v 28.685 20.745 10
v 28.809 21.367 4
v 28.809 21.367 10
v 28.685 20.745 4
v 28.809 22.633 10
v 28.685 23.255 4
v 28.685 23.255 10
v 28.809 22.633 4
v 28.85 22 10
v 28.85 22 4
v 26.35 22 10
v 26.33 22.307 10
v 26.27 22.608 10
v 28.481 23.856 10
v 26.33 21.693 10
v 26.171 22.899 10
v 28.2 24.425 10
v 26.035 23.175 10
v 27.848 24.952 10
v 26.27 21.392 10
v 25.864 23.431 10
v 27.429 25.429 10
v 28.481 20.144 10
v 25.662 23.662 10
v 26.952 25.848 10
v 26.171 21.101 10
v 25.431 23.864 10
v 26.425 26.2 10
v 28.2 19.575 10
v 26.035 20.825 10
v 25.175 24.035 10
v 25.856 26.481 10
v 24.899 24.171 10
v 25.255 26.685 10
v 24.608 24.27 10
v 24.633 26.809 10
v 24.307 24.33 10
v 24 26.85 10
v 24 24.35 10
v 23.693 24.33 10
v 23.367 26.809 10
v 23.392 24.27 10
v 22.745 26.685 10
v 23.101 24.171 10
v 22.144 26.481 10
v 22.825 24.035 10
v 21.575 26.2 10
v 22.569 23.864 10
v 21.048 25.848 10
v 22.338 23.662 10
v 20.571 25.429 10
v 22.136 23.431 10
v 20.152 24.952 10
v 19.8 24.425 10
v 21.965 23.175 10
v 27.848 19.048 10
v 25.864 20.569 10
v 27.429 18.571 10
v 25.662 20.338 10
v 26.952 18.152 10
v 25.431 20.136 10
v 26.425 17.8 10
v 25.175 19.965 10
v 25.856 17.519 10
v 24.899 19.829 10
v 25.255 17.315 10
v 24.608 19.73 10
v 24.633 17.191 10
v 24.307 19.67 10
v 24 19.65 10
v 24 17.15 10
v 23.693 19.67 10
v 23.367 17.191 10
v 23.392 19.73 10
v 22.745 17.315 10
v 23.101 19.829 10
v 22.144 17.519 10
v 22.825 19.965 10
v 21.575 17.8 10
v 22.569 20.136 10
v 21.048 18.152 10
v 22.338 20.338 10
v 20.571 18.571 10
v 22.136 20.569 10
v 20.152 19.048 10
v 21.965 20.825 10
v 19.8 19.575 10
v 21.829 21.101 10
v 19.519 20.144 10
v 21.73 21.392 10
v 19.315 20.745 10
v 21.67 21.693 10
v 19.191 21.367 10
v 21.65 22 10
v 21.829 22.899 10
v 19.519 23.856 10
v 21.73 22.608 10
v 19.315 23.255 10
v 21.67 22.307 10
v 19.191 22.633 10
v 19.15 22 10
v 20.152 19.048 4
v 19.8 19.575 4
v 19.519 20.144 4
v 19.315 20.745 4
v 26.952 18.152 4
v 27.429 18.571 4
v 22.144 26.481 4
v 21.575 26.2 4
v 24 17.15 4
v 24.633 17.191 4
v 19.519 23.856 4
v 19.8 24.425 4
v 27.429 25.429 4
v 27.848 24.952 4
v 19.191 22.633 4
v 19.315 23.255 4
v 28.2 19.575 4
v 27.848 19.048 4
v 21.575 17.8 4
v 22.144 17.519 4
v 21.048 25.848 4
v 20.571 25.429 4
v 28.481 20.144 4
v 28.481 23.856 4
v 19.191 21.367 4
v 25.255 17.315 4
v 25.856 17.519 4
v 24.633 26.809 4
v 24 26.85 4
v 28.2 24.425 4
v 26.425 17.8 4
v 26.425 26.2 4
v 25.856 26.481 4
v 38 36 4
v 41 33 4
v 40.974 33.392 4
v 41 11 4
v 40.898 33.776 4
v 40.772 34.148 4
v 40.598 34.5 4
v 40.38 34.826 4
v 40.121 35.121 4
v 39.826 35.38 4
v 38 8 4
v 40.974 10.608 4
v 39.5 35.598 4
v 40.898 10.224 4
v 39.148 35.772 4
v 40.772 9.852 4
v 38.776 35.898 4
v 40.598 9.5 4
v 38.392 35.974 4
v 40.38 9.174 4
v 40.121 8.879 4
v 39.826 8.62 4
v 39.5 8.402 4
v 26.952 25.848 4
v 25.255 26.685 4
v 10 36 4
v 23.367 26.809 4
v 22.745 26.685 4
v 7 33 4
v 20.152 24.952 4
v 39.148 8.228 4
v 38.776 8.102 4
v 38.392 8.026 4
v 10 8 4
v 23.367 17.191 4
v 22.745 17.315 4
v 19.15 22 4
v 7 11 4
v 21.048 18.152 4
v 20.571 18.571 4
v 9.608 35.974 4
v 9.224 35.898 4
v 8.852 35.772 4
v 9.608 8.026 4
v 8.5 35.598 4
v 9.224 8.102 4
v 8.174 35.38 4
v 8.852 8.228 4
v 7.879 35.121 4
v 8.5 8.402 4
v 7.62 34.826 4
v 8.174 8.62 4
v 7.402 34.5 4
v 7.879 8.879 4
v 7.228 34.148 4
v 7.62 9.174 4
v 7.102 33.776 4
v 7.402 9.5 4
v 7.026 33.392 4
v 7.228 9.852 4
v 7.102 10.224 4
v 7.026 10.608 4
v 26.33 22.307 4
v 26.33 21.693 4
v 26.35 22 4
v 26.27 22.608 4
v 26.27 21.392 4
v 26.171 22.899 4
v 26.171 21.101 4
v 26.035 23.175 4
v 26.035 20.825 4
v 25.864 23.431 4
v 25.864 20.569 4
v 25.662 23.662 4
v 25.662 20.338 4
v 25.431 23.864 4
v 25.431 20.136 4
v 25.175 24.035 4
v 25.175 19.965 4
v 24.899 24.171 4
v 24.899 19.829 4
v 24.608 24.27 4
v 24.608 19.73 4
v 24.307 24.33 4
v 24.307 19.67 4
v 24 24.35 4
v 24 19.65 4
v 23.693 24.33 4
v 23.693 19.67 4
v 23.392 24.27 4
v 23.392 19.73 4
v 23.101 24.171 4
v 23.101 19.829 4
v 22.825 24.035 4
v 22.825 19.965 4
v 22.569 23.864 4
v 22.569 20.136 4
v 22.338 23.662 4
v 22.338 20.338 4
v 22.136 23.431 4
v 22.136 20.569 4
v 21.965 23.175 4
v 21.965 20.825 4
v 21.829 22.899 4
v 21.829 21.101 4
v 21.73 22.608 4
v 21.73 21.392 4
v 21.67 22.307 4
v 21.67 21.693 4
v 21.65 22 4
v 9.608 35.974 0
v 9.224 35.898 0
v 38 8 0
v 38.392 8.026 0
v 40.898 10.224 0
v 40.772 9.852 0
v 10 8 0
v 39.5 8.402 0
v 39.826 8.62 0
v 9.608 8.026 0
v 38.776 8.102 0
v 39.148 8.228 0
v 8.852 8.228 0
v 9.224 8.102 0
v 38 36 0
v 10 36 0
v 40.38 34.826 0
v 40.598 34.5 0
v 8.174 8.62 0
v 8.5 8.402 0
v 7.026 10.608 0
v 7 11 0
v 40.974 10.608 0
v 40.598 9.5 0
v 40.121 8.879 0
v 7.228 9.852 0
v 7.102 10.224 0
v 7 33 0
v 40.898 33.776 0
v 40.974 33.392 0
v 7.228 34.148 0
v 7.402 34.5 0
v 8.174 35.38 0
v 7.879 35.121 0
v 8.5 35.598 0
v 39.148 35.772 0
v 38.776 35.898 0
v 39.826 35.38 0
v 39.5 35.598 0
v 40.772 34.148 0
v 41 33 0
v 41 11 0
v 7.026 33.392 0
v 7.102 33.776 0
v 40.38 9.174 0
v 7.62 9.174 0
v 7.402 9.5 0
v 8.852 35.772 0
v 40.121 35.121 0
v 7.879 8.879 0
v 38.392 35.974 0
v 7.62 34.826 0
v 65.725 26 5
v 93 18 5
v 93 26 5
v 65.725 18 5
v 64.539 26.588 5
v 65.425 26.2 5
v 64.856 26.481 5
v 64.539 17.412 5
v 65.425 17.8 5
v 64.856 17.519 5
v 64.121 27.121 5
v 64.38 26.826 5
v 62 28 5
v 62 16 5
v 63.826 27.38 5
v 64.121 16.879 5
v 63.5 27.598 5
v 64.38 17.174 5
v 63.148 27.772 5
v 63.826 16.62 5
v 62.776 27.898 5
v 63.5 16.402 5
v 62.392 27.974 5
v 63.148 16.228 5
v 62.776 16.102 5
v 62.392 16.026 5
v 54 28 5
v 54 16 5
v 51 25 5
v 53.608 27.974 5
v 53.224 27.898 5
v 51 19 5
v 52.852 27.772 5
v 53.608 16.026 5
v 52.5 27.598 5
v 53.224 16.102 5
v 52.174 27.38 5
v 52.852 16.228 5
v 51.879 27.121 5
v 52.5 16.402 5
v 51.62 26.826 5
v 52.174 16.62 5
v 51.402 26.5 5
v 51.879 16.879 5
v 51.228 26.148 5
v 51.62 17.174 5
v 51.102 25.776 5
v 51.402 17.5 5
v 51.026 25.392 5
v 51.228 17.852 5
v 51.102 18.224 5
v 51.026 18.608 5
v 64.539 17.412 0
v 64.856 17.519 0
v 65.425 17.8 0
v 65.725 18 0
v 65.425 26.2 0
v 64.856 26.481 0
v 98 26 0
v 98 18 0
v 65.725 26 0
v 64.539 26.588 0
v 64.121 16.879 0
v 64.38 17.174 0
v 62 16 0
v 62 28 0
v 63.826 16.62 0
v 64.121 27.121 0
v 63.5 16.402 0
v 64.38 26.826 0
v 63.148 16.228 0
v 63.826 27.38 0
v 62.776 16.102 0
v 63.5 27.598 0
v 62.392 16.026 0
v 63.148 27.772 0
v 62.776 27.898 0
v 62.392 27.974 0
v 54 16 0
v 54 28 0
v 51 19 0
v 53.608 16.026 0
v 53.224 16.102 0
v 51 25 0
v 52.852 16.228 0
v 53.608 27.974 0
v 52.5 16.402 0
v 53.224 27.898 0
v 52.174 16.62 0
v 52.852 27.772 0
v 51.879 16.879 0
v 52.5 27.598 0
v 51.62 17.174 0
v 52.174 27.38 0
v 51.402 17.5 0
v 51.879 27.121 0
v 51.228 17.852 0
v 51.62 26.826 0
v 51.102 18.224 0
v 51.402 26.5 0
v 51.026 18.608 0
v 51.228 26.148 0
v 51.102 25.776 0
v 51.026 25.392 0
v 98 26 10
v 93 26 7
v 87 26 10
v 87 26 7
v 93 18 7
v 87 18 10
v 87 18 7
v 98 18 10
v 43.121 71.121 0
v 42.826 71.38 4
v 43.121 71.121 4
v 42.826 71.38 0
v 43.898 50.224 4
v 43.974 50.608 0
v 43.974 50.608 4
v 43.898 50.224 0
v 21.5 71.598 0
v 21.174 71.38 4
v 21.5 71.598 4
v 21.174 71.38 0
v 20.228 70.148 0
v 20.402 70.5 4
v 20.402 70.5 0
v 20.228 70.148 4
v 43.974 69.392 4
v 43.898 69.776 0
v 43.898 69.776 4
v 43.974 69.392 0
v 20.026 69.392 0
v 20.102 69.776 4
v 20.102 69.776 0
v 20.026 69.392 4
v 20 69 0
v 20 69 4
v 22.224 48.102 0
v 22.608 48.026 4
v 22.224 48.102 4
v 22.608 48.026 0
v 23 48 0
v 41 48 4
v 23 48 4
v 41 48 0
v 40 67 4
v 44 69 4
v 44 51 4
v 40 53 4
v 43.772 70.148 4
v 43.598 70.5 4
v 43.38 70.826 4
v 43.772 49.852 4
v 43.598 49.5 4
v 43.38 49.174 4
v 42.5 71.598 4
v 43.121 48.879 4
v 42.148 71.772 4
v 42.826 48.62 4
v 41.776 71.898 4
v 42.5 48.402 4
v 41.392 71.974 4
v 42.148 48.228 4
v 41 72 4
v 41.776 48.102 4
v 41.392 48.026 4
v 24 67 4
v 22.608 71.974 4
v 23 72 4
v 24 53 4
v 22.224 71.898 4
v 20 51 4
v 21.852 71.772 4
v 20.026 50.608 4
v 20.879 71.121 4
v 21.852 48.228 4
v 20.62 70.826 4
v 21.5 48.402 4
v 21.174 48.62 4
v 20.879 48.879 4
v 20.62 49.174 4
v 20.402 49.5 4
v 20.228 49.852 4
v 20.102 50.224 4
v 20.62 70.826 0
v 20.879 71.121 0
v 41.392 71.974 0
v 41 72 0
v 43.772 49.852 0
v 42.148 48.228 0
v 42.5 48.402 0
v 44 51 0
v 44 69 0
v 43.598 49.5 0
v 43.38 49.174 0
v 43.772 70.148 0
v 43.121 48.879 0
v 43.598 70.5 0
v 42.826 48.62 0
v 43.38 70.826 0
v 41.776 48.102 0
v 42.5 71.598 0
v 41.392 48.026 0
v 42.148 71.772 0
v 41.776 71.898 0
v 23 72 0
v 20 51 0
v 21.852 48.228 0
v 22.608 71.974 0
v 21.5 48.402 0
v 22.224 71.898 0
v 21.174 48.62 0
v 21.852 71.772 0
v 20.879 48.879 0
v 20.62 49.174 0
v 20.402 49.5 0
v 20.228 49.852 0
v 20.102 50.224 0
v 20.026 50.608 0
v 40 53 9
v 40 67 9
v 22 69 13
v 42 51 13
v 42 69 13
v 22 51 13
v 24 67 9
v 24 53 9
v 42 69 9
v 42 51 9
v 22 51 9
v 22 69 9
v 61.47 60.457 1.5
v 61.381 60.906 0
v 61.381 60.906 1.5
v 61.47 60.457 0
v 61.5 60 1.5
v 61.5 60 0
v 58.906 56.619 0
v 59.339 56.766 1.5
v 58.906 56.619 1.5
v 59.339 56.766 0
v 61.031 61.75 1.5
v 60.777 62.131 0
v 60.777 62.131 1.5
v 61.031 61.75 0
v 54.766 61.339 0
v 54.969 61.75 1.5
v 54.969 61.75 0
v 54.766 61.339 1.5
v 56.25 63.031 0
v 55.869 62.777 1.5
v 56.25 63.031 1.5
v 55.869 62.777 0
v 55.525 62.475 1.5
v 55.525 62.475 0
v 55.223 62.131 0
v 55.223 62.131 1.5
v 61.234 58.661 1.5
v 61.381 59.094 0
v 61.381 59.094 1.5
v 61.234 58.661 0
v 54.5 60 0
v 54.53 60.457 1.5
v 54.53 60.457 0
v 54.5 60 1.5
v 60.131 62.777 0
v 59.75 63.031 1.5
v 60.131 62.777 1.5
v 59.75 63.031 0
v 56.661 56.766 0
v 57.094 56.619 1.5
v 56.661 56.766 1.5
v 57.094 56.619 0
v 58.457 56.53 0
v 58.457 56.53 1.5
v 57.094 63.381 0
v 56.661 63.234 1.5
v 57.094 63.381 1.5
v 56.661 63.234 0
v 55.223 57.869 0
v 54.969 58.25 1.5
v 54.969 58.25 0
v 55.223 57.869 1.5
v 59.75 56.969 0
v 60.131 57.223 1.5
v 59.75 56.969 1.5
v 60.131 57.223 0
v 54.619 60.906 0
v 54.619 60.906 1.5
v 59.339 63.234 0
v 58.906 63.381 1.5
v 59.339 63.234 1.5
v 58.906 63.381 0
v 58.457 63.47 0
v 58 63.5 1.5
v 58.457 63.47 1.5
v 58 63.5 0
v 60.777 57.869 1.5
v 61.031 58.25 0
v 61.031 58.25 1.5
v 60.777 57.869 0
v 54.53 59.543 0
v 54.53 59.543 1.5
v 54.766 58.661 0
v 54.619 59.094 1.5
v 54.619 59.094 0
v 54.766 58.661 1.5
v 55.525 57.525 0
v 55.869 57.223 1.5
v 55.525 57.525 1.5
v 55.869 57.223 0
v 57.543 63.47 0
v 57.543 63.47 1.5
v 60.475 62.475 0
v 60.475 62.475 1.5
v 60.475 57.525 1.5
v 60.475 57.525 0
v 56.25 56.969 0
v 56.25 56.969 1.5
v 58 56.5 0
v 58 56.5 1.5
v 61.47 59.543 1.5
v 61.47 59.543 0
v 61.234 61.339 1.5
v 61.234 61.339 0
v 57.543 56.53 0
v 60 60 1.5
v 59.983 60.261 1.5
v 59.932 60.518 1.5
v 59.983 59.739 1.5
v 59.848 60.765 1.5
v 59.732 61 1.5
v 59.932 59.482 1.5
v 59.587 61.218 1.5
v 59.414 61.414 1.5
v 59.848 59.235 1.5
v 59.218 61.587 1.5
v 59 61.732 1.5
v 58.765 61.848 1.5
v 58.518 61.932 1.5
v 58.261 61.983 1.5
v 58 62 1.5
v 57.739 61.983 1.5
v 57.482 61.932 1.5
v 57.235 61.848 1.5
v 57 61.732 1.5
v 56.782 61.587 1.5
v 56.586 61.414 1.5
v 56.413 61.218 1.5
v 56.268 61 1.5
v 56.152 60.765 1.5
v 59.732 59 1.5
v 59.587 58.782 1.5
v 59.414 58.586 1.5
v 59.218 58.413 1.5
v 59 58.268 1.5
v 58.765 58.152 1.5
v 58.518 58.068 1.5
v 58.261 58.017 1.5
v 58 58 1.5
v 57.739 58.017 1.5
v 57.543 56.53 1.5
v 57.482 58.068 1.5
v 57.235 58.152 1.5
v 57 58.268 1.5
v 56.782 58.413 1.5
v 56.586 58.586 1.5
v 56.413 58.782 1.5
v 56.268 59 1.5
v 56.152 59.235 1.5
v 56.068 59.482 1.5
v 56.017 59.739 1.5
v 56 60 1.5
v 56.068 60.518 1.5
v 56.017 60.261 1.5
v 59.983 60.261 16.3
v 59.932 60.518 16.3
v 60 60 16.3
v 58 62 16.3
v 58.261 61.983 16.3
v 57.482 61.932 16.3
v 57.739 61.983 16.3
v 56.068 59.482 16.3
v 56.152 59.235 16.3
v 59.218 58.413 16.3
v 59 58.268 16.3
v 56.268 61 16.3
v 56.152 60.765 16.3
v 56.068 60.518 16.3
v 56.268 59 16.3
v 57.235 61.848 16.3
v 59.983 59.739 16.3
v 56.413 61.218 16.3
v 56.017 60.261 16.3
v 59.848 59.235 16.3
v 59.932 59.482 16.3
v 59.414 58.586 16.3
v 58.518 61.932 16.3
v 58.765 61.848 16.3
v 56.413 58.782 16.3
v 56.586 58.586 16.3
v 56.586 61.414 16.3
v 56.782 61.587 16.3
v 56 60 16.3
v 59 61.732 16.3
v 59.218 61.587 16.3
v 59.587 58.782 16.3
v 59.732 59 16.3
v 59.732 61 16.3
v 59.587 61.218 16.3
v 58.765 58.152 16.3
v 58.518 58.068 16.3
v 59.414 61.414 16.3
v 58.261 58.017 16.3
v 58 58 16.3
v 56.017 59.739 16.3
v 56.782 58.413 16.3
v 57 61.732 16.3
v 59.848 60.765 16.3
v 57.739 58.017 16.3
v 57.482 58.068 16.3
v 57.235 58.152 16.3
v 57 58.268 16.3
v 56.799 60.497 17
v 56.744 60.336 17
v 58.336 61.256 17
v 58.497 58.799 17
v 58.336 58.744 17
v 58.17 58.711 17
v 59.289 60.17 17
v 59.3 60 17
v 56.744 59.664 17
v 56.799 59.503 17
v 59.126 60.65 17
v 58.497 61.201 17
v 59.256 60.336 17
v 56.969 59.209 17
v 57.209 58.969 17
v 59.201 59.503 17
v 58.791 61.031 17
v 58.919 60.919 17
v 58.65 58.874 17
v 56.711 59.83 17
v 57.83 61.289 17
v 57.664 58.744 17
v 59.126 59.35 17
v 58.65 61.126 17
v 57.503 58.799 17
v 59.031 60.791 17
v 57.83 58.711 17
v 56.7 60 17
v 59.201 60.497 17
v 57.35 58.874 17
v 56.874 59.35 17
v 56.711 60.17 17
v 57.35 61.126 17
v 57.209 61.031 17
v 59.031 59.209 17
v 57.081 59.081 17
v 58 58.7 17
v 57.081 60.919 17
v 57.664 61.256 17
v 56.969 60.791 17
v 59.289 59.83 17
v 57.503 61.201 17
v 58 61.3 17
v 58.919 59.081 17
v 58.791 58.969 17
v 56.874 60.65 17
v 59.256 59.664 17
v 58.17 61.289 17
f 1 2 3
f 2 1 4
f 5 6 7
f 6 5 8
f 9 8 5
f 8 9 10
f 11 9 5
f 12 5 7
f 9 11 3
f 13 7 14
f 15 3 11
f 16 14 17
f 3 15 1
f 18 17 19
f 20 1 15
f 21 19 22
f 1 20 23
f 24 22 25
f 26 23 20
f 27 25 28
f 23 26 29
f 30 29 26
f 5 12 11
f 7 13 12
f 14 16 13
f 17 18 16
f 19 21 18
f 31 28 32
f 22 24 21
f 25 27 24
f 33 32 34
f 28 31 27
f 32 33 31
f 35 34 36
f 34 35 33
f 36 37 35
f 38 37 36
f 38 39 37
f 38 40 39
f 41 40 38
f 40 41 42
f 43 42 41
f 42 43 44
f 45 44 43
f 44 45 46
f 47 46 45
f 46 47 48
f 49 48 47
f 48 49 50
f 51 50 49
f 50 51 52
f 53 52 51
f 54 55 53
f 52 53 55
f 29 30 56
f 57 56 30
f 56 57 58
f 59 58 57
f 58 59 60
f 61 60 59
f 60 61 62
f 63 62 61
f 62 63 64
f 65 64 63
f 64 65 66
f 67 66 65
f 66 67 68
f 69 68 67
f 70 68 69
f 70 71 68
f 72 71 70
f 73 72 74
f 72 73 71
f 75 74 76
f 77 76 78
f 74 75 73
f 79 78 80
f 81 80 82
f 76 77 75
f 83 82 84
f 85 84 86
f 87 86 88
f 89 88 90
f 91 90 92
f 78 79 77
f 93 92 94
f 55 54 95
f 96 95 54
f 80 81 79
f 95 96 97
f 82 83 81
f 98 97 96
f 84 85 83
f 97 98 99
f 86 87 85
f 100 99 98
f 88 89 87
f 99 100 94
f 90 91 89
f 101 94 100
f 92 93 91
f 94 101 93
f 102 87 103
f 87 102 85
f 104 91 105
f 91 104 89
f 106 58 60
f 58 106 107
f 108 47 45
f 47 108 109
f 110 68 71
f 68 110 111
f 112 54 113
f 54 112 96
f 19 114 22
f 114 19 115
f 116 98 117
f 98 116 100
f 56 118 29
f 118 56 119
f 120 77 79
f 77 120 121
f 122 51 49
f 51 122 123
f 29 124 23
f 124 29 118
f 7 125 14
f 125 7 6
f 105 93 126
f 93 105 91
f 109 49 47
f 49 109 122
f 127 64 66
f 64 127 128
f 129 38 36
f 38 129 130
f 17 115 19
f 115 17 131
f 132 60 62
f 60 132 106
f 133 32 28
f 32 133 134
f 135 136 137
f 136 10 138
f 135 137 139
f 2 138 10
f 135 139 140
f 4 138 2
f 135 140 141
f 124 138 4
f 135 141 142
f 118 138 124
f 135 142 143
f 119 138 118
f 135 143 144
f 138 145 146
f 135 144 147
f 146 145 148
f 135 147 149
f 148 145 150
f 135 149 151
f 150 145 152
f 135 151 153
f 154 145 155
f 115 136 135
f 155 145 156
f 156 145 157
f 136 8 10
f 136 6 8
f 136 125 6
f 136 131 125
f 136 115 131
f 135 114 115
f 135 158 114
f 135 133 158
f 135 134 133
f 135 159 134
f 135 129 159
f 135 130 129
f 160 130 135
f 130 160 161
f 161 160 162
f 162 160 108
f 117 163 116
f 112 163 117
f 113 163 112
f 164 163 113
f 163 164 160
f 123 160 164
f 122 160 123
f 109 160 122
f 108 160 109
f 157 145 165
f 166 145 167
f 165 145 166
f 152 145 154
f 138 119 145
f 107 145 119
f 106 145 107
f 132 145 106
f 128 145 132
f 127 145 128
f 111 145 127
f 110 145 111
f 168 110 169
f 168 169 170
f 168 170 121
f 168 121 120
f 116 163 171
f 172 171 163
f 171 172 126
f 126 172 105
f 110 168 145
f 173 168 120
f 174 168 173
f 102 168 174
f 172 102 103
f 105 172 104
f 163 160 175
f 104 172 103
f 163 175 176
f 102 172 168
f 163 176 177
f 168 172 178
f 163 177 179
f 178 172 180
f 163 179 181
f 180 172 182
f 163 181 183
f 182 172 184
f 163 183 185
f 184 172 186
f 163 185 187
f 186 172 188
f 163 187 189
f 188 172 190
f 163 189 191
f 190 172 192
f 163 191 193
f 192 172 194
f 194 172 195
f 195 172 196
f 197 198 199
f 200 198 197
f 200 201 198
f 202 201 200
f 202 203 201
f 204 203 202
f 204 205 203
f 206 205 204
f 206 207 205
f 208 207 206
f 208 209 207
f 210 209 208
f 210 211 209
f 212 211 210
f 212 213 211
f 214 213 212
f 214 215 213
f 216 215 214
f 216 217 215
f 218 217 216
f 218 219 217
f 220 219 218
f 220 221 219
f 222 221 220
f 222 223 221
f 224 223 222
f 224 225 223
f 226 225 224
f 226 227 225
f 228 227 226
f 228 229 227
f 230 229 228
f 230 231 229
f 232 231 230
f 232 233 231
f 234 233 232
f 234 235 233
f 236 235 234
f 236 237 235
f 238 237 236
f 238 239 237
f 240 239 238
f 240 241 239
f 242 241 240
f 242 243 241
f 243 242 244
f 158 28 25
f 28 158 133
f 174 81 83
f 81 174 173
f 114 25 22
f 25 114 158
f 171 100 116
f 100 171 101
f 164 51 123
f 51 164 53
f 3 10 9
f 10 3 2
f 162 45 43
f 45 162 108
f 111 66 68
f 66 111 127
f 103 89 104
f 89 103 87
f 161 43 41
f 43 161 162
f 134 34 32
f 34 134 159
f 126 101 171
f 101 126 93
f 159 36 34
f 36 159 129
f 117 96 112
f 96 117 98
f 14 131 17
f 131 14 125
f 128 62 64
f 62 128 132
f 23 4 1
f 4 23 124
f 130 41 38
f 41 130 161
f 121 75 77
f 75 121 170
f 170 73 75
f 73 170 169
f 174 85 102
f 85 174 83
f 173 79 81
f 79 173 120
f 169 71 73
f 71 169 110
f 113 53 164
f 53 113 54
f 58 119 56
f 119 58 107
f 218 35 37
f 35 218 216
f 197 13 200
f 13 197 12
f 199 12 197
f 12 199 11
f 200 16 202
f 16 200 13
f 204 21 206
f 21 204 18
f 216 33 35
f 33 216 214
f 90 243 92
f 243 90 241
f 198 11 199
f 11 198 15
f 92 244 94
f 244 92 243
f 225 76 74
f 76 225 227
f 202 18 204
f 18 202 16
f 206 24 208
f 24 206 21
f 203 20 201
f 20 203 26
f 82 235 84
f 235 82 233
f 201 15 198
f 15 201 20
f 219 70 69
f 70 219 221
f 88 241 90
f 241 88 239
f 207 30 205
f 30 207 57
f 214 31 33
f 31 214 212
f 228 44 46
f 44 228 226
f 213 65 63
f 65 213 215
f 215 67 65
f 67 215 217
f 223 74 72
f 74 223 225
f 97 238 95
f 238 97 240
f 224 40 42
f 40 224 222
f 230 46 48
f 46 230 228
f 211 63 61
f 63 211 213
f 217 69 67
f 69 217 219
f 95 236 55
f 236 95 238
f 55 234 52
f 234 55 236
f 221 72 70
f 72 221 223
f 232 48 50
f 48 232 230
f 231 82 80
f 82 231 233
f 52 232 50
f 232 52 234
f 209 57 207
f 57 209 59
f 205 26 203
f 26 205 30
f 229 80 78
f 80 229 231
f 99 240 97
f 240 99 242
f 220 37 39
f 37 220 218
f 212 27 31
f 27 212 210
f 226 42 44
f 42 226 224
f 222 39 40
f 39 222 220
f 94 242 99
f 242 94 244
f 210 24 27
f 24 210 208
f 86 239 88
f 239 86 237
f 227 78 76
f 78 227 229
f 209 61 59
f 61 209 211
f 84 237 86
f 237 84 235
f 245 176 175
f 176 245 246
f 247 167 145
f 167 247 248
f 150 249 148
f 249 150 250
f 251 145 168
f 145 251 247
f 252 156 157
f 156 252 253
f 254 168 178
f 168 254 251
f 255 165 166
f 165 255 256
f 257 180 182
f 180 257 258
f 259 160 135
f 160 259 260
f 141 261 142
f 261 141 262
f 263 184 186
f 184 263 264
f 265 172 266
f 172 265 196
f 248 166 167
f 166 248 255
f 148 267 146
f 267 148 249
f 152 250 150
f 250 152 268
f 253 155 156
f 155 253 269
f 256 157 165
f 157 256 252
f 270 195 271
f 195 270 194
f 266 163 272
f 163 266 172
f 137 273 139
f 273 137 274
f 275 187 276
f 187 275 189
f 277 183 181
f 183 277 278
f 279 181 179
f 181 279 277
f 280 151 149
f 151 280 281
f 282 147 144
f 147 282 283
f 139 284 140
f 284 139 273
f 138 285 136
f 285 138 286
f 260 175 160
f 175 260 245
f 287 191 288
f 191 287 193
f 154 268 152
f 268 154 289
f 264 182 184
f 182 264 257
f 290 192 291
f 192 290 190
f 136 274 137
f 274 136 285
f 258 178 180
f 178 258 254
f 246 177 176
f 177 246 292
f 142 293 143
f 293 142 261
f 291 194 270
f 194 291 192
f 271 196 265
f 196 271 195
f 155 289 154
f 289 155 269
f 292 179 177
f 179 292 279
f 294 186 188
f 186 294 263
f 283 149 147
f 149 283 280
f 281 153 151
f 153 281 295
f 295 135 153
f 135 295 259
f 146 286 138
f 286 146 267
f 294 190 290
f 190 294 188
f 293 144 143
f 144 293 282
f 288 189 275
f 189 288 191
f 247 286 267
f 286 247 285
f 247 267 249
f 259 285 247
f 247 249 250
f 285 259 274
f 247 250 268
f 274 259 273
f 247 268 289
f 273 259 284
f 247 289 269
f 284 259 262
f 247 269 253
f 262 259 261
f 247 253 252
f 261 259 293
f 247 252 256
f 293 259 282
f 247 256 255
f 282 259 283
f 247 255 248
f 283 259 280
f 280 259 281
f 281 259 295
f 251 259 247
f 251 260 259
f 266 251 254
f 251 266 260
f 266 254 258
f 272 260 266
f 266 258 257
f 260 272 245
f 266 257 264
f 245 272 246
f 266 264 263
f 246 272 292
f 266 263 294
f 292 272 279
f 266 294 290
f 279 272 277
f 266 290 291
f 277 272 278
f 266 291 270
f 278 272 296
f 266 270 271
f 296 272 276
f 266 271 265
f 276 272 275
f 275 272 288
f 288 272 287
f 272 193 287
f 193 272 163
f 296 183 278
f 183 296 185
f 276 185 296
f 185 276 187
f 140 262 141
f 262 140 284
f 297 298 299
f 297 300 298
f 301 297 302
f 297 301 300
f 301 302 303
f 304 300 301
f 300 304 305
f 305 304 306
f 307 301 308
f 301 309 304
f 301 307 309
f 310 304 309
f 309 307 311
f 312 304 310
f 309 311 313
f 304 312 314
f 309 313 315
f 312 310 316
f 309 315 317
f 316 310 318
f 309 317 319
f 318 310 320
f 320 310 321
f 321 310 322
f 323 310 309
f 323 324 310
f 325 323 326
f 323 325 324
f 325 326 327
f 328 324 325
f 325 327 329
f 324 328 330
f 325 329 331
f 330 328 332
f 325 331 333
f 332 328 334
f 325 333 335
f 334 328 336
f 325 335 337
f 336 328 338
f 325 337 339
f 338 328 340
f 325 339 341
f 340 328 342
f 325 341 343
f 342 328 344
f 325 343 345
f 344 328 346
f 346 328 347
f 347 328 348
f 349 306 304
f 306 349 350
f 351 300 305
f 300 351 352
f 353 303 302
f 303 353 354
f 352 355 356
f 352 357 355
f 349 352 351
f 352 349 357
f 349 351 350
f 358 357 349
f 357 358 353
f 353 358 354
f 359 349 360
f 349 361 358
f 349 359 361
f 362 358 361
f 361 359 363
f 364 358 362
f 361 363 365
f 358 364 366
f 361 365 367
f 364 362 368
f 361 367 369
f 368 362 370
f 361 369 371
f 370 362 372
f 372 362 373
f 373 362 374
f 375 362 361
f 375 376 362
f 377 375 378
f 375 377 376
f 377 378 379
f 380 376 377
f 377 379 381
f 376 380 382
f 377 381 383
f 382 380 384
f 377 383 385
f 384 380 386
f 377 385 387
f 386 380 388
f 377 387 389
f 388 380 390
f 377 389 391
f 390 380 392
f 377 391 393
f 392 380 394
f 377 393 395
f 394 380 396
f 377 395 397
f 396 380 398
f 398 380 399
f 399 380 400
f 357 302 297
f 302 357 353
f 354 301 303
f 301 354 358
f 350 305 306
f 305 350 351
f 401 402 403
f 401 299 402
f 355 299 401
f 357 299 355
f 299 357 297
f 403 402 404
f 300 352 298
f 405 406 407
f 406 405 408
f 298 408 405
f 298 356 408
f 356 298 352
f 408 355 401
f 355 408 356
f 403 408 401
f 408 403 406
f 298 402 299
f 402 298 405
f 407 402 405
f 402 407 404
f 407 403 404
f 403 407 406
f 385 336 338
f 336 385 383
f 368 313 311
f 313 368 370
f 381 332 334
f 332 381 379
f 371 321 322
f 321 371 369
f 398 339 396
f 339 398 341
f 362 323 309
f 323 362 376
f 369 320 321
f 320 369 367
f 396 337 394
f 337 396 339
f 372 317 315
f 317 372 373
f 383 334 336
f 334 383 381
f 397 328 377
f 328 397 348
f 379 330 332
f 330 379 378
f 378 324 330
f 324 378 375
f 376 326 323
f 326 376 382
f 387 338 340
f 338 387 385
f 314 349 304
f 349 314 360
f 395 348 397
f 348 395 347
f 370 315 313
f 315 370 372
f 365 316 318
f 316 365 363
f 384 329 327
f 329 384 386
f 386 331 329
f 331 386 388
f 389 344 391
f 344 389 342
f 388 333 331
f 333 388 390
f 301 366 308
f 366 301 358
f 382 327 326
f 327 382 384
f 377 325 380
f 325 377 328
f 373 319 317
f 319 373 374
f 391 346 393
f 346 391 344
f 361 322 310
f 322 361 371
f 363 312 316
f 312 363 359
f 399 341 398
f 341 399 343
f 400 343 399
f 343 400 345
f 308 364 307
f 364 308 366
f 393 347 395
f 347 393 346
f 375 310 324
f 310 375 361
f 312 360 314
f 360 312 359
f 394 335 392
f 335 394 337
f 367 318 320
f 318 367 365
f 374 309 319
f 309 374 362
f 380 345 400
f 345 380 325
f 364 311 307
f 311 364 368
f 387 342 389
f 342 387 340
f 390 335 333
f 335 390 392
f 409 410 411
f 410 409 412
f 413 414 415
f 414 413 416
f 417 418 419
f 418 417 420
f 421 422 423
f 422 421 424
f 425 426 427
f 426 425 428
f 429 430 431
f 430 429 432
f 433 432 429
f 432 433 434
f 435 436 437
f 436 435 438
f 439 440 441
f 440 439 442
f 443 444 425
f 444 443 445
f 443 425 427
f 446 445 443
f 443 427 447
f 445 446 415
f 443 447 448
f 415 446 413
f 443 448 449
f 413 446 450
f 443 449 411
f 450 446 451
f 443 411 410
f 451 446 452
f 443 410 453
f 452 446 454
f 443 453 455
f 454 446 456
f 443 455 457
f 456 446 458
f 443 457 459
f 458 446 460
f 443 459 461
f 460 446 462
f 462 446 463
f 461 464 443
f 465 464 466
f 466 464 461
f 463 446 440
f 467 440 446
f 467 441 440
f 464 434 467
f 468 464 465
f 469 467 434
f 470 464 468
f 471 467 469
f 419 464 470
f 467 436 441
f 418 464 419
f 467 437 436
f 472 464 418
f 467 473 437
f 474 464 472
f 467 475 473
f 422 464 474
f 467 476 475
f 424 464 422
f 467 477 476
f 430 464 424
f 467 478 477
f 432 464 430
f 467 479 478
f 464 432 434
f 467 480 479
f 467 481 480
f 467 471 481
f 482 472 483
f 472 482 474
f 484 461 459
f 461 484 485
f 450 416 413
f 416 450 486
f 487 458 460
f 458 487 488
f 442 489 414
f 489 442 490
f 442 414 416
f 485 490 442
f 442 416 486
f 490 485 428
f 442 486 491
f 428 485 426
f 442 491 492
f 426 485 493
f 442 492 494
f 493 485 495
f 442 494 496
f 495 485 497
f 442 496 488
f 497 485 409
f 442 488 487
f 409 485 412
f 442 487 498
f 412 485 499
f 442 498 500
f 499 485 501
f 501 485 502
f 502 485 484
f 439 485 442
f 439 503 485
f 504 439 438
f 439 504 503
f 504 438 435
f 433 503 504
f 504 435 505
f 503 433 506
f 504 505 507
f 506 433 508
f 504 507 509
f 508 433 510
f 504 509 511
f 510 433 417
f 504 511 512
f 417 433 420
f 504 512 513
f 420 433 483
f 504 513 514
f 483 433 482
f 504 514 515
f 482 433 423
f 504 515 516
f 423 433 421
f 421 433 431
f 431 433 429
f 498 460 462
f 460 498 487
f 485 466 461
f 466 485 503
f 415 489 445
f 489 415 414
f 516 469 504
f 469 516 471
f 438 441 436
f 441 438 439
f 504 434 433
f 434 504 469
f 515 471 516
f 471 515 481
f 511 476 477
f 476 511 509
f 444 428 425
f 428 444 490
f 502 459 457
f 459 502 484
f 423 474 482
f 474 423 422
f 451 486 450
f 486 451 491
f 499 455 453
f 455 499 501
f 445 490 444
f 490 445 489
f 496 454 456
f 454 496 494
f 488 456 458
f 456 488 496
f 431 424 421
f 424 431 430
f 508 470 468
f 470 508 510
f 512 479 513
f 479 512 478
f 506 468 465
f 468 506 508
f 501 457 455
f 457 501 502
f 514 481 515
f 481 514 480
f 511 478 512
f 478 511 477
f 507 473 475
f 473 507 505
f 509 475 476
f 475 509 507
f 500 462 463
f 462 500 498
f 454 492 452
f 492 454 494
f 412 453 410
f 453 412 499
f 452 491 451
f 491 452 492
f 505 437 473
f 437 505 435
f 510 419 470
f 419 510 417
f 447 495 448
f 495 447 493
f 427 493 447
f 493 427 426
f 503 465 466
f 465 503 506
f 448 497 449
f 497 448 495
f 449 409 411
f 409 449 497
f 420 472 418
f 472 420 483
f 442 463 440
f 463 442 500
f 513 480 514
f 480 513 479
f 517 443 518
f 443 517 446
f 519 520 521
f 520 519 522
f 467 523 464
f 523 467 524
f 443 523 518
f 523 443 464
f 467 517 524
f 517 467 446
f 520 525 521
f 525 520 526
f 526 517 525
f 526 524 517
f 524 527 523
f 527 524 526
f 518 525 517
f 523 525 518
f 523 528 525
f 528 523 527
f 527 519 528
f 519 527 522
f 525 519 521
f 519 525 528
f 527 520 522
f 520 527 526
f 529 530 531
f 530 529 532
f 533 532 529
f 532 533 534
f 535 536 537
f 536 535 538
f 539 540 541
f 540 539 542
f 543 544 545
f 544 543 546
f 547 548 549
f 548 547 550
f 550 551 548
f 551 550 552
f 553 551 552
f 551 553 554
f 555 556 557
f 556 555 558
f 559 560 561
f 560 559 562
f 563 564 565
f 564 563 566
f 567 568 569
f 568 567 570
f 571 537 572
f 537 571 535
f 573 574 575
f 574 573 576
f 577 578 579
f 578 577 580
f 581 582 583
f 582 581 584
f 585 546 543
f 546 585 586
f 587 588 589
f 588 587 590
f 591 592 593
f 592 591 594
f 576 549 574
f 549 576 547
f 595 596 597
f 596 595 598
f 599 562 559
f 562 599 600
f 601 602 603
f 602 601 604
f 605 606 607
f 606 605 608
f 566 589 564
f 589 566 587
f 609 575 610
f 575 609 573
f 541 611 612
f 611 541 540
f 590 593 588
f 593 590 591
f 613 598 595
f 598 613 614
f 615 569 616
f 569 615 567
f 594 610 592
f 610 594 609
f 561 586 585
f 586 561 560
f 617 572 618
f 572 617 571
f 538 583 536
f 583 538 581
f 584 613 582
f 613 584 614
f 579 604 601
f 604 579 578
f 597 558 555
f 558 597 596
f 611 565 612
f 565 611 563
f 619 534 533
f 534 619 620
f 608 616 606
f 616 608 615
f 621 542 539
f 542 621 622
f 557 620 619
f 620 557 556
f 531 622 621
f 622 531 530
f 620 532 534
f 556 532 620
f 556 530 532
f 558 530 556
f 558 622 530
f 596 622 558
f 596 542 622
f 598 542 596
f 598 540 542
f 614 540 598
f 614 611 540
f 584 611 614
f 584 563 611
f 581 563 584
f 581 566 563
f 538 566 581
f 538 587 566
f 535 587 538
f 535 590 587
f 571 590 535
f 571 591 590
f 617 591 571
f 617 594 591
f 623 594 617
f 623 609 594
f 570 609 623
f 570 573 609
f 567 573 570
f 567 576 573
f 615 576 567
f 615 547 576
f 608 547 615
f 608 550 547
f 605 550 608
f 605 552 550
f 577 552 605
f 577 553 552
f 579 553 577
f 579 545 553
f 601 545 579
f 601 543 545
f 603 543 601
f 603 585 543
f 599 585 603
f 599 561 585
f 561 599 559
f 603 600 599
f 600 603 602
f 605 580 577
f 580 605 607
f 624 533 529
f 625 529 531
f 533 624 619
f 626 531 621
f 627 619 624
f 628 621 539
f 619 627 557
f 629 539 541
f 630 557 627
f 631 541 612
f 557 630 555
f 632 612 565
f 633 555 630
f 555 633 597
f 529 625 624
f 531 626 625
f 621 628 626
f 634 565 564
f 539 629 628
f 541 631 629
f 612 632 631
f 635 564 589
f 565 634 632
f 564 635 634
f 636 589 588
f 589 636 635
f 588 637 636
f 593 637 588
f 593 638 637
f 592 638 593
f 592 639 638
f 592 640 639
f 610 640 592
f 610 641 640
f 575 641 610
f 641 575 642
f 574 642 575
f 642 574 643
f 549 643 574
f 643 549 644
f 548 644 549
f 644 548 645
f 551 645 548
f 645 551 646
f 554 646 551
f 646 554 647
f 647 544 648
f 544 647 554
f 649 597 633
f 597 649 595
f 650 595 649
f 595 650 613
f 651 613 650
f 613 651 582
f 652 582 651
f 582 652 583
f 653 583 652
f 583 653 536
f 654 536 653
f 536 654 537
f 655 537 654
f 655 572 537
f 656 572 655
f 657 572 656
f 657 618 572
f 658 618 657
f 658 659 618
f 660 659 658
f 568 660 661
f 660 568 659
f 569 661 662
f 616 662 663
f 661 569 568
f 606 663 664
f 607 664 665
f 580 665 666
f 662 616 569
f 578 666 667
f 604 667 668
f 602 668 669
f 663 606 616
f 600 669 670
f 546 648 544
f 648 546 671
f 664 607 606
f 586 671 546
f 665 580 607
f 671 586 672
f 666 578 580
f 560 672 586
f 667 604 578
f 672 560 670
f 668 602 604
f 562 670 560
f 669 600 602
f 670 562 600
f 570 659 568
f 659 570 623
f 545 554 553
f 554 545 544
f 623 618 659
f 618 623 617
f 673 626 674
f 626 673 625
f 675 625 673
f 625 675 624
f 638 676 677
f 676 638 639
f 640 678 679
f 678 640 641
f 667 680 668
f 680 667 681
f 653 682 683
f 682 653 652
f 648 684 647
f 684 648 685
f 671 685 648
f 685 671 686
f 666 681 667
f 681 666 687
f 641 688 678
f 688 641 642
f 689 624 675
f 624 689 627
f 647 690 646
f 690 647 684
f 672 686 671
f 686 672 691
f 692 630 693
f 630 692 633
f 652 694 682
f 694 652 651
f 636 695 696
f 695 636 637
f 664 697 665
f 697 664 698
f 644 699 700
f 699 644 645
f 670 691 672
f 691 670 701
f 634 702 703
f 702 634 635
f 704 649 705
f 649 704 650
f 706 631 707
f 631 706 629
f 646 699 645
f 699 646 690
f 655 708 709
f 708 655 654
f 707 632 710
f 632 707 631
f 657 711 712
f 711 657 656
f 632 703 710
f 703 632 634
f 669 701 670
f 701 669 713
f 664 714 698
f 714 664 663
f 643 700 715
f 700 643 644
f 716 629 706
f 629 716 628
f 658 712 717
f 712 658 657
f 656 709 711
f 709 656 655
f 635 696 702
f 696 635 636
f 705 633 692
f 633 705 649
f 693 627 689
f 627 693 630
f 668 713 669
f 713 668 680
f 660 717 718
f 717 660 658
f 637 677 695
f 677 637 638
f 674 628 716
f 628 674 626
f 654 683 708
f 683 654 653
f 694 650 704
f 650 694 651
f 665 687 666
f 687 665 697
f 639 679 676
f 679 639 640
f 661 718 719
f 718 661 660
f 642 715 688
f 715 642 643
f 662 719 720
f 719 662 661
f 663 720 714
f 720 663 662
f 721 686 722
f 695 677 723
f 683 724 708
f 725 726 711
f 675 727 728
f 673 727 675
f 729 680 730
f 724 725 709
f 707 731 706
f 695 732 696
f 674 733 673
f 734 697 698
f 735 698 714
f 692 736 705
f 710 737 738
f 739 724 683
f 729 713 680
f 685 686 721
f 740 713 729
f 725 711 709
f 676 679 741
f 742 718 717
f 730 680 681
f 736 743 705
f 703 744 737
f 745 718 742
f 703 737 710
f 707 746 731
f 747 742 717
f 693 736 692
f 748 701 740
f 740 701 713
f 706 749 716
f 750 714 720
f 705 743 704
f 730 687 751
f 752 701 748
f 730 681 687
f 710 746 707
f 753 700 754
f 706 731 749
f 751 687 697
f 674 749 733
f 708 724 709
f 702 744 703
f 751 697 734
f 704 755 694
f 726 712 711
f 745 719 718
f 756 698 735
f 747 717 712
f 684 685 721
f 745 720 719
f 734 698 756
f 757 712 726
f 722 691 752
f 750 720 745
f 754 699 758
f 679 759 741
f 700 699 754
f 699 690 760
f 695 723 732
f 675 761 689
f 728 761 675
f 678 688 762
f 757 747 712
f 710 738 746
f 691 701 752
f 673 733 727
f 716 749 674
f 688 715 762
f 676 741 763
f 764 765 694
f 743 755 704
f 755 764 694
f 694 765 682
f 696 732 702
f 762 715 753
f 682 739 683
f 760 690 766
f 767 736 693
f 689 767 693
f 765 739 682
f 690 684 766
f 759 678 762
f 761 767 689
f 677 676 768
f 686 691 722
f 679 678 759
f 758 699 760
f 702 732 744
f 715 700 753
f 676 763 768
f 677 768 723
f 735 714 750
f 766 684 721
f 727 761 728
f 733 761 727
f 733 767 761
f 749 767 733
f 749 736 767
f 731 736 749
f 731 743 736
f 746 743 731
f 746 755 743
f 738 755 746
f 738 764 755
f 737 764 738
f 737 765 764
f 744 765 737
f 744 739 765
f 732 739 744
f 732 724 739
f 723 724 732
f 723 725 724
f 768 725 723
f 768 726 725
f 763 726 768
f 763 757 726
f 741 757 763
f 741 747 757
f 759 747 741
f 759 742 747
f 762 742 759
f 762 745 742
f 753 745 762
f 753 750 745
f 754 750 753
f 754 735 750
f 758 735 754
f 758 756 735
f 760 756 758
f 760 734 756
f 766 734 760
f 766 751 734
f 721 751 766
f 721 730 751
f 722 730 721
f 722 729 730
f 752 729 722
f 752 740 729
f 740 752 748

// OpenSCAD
/*
Sample 075: Drehhakenverschluss — 0,35 mm
Generated from the FDM Mechanical Sample Library.
Units: millimetres.

Override examples:
  openscad -o custom.stl -D 'view="plate"' -D 'render_fn=64' model.scad
  openscad -o preview.png -D 'view="assembly"' model.scad
*/
use <../../../library/fdm_mechanisms.scad>

render_fn = is_undef(render_fn) ? 48 : render_fn;
view = is_undef(view) ? "plate" : view;
$fn = render_fn;

sample_hook_latch(
    view=view,
    pin_d=4,
    clearance=0.35,
    arm=34
);
